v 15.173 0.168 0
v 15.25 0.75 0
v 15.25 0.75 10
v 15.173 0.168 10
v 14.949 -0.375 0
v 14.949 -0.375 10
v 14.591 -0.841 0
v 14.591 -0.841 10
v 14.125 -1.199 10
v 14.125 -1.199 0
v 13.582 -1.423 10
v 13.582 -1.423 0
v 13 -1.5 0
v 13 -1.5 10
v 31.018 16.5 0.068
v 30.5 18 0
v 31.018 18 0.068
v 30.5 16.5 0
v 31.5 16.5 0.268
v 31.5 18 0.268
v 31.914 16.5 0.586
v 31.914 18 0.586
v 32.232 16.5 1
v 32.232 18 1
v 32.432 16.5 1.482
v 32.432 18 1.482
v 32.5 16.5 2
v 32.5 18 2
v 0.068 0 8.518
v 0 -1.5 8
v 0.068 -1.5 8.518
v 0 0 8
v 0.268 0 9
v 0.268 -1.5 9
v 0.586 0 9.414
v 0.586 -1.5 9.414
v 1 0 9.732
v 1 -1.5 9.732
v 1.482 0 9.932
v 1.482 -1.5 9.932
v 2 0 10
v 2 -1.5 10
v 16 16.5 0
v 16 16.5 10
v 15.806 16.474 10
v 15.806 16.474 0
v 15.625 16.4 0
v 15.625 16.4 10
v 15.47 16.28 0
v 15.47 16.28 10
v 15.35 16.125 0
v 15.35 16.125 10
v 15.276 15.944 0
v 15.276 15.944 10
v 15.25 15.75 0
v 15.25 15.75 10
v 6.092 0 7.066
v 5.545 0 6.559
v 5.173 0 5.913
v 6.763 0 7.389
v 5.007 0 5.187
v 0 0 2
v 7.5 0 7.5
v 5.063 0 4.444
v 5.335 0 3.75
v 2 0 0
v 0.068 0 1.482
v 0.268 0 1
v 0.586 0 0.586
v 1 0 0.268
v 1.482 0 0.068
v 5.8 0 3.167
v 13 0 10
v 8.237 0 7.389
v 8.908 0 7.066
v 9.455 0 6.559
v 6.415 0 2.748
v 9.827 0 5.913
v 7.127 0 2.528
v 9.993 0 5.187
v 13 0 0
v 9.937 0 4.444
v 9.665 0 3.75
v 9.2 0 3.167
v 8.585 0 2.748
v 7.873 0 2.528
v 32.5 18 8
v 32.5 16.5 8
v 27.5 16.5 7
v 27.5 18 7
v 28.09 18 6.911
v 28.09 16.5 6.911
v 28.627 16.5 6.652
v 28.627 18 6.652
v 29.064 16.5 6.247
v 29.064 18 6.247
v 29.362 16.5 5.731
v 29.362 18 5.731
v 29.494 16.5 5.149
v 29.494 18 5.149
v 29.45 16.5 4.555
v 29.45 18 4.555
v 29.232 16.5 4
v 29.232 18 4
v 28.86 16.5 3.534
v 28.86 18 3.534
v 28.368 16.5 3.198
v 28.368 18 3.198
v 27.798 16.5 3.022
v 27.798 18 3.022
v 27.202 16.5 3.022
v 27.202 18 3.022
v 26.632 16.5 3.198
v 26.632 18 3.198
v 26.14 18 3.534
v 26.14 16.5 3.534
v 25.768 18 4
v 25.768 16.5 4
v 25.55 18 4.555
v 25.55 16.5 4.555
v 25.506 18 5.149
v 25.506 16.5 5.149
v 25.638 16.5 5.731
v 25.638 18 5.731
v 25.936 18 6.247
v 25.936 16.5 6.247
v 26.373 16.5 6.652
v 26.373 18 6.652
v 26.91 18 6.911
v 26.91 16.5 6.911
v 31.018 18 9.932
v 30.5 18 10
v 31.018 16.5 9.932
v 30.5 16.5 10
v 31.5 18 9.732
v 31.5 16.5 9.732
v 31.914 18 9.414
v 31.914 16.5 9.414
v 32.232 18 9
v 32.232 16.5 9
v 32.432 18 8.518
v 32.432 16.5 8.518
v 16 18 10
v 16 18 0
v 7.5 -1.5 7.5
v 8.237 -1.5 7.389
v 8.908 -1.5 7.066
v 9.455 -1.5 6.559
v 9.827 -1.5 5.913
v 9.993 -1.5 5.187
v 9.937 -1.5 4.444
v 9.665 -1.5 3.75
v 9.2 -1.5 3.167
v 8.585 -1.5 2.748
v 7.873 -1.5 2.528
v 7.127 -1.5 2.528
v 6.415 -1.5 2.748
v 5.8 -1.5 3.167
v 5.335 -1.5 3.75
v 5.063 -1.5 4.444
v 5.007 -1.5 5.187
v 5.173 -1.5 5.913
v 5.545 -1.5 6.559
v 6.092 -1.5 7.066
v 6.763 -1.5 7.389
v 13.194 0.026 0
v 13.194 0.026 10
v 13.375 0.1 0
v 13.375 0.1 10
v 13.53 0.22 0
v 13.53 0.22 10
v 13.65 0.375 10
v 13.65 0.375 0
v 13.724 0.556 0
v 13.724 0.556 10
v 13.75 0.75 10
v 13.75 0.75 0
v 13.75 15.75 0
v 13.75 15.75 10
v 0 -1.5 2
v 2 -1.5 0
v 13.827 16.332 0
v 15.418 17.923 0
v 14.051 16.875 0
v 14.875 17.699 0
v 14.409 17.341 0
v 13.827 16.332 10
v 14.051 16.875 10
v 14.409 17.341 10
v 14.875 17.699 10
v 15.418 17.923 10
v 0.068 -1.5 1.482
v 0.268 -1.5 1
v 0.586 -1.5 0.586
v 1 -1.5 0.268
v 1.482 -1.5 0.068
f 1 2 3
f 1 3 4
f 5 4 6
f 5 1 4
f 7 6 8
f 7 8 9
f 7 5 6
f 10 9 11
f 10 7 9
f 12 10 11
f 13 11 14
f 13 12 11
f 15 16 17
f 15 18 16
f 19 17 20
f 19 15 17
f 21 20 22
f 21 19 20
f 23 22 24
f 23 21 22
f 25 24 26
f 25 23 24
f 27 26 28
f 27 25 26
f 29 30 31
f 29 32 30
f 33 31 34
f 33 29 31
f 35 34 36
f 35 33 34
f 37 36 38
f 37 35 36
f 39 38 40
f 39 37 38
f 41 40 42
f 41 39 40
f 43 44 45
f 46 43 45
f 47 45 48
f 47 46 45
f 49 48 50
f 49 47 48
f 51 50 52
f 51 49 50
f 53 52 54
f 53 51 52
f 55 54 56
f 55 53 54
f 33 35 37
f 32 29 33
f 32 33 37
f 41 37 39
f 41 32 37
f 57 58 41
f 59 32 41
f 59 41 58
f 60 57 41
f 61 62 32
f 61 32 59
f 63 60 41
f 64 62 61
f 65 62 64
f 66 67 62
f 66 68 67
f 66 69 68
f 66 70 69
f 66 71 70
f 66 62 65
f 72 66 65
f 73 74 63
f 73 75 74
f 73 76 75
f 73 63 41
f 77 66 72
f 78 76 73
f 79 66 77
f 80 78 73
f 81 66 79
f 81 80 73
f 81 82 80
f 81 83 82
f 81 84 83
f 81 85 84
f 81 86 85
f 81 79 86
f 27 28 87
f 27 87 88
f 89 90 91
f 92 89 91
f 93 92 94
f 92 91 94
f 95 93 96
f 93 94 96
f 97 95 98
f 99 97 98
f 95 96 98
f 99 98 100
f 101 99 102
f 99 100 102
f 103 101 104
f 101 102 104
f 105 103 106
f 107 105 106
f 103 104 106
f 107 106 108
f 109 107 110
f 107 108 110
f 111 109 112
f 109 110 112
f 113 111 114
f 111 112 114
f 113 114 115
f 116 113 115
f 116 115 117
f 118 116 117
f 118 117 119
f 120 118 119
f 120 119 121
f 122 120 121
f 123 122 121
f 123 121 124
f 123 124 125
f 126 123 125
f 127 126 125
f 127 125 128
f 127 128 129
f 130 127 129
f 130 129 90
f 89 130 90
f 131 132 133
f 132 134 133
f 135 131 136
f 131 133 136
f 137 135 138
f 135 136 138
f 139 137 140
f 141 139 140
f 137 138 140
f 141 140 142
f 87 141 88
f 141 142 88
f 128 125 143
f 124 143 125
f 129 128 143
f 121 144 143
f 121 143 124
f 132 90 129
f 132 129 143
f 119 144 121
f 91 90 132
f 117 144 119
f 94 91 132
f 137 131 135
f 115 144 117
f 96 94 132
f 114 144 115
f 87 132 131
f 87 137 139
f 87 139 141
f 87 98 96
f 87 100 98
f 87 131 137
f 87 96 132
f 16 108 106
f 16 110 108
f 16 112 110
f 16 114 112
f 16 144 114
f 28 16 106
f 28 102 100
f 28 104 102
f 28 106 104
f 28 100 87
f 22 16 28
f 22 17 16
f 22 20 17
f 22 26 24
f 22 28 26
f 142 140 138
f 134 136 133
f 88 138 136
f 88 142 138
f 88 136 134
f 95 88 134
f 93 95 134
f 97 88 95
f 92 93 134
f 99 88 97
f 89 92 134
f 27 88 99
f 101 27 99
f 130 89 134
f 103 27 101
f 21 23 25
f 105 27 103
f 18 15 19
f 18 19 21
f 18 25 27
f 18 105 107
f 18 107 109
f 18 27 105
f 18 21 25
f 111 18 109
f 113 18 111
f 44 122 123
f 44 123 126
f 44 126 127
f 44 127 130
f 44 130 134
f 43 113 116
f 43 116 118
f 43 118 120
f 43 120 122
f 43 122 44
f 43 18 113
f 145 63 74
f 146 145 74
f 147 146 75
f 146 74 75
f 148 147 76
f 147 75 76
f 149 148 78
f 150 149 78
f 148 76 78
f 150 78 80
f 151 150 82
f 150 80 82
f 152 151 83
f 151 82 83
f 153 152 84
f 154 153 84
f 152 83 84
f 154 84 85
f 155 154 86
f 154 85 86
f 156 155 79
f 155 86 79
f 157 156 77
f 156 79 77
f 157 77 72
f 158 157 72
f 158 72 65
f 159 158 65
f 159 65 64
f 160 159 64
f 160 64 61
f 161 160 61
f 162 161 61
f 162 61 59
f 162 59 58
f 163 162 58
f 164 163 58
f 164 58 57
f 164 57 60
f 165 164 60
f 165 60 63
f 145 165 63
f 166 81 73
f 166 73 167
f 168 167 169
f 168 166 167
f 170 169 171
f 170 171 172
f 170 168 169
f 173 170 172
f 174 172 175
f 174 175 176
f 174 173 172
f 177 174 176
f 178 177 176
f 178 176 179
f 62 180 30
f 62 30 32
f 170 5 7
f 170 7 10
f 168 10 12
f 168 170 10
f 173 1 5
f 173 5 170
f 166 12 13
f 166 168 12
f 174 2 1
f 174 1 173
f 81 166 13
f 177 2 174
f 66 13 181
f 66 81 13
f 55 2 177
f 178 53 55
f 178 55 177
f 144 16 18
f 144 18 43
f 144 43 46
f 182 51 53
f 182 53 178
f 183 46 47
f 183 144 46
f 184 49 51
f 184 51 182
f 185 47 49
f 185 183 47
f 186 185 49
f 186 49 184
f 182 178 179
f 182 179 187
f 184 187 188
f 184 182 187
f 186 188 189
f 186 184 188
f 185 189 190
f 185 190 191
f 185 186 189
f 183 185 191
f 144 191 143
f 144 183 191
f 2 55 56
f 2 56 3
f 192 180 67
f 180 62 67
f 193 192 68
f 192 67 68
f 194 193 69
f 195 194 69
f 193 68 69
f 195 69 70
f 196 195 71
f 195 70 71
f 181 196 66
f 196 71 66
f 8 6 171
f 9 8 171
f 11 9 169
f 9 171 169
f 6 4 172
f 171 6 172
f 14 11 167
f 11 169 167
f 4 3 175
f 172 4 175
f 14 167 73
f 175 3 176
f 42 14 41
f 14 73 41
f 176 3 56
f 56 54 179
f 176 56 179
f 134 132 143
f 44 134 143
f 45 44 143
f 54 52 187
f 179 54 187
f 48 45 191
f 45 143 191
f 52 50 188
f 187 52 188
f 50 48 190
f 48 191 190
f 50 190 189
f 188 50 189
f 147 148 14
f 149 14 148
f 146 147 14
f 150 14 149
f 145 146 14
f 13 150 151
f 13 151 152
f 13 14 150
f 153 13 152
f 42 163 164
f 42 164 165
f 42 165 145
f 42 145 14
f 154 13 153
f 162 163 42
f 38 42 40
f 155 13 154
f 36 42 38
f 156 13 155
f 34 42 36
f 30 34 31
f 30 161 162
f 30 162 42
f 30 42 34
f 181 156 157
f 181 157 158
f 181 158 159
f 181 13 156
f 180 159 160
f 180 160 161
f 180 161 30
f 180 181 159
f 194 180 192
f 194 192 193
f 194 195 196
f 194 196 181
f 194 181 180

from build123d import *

# Parameters (mm, degrees)
BASE_FLANGE1_DEPTH = 10
SKETCH6_R          = 2.5
CUT_EXTRUDE1_DEPTH = 39.474017206
SKETCH7_R          = 2
CUT_EXTRUDE2_DEPTH = 40.198214245
FILLET1_R          = 2


# Sheet-metal steps are written as plain solids
with BuildPart() as part:
    # Sketch1 → Base-Flange1 (new body)
    with BuildSketch(Plane.XY):
        with BuildLine():
            Line((0, 0), (13, 0))
            ThreePointArc((13, 0), (13.530330086, 0.219669914), (13.75, 0.75))
            Line((13.75, 0.75), (13.75, 15.75))
            ThreePointArc((13.75, 15.75), (14.409009742, 17.340990258), (16, 18))
            Line((16, 18), (32.5, 18))
            Line((32.5, 18), (32.5, 16.5))
            Line((32.5, 16.5), (16, 16.5))
            ThreePointArc((16, 16.5), (15.469669914, 16.280330086), (15.25, 15.75))
            Line((15.25, 15.75), (15.25, 0.75))
            ThreePointArc((15.25, 0.75), (14.590990258, -0.840990258), (13, -1.5))
            Line((13, -1.5), (0, -1.5))
            Line((0, -1.5), (0, 0))
        make_face()
    extrude(amount=BASE_FLANGE1_DEPTH)

    # Sketch6 → Cut-Extrude1 (cut, through all)
    with BuildSketch(Plane(origin=(0, 0, 0), x_dir=(1, 0, 0), z_dir=(0, 1, 0))):
        with Locations(Location((7.5, -5, 0), (0, 0, 270))):
            Circle(SKETCH6_R)
    extrude(amount=-CUT_EXTRUDE1_DEPTH, mode=Mode.SUBTRACT)

    # Sketch7 → Cut-Extrude2 (cut, through all)
    with BuildSketch(Plane(origin=(0, 18, 0), x_dir=(1, 0, 0), z_dir=(0, 1, 0))):
        with Locations(Location((27.5, -5, 0), (0, 0, 270))):
            Circle(SKETCH7_R)
    extrude(amount=-CUT_EXTRUDE2_DEPTH, mode=Mode.SUBTRACT)

    # Fillet1
    fillet1_edges = [part.edges().sort_by_distance(p)[0] for p in [
        (0, -0.75, 0),
        (32.5, 17.25, 0),
        (0, -0.75, 10),
        (32.5, 17.25, 10),
    ]]
    fillet(fillet1_edges, radius=FILLET1_R)


solid = part.part
